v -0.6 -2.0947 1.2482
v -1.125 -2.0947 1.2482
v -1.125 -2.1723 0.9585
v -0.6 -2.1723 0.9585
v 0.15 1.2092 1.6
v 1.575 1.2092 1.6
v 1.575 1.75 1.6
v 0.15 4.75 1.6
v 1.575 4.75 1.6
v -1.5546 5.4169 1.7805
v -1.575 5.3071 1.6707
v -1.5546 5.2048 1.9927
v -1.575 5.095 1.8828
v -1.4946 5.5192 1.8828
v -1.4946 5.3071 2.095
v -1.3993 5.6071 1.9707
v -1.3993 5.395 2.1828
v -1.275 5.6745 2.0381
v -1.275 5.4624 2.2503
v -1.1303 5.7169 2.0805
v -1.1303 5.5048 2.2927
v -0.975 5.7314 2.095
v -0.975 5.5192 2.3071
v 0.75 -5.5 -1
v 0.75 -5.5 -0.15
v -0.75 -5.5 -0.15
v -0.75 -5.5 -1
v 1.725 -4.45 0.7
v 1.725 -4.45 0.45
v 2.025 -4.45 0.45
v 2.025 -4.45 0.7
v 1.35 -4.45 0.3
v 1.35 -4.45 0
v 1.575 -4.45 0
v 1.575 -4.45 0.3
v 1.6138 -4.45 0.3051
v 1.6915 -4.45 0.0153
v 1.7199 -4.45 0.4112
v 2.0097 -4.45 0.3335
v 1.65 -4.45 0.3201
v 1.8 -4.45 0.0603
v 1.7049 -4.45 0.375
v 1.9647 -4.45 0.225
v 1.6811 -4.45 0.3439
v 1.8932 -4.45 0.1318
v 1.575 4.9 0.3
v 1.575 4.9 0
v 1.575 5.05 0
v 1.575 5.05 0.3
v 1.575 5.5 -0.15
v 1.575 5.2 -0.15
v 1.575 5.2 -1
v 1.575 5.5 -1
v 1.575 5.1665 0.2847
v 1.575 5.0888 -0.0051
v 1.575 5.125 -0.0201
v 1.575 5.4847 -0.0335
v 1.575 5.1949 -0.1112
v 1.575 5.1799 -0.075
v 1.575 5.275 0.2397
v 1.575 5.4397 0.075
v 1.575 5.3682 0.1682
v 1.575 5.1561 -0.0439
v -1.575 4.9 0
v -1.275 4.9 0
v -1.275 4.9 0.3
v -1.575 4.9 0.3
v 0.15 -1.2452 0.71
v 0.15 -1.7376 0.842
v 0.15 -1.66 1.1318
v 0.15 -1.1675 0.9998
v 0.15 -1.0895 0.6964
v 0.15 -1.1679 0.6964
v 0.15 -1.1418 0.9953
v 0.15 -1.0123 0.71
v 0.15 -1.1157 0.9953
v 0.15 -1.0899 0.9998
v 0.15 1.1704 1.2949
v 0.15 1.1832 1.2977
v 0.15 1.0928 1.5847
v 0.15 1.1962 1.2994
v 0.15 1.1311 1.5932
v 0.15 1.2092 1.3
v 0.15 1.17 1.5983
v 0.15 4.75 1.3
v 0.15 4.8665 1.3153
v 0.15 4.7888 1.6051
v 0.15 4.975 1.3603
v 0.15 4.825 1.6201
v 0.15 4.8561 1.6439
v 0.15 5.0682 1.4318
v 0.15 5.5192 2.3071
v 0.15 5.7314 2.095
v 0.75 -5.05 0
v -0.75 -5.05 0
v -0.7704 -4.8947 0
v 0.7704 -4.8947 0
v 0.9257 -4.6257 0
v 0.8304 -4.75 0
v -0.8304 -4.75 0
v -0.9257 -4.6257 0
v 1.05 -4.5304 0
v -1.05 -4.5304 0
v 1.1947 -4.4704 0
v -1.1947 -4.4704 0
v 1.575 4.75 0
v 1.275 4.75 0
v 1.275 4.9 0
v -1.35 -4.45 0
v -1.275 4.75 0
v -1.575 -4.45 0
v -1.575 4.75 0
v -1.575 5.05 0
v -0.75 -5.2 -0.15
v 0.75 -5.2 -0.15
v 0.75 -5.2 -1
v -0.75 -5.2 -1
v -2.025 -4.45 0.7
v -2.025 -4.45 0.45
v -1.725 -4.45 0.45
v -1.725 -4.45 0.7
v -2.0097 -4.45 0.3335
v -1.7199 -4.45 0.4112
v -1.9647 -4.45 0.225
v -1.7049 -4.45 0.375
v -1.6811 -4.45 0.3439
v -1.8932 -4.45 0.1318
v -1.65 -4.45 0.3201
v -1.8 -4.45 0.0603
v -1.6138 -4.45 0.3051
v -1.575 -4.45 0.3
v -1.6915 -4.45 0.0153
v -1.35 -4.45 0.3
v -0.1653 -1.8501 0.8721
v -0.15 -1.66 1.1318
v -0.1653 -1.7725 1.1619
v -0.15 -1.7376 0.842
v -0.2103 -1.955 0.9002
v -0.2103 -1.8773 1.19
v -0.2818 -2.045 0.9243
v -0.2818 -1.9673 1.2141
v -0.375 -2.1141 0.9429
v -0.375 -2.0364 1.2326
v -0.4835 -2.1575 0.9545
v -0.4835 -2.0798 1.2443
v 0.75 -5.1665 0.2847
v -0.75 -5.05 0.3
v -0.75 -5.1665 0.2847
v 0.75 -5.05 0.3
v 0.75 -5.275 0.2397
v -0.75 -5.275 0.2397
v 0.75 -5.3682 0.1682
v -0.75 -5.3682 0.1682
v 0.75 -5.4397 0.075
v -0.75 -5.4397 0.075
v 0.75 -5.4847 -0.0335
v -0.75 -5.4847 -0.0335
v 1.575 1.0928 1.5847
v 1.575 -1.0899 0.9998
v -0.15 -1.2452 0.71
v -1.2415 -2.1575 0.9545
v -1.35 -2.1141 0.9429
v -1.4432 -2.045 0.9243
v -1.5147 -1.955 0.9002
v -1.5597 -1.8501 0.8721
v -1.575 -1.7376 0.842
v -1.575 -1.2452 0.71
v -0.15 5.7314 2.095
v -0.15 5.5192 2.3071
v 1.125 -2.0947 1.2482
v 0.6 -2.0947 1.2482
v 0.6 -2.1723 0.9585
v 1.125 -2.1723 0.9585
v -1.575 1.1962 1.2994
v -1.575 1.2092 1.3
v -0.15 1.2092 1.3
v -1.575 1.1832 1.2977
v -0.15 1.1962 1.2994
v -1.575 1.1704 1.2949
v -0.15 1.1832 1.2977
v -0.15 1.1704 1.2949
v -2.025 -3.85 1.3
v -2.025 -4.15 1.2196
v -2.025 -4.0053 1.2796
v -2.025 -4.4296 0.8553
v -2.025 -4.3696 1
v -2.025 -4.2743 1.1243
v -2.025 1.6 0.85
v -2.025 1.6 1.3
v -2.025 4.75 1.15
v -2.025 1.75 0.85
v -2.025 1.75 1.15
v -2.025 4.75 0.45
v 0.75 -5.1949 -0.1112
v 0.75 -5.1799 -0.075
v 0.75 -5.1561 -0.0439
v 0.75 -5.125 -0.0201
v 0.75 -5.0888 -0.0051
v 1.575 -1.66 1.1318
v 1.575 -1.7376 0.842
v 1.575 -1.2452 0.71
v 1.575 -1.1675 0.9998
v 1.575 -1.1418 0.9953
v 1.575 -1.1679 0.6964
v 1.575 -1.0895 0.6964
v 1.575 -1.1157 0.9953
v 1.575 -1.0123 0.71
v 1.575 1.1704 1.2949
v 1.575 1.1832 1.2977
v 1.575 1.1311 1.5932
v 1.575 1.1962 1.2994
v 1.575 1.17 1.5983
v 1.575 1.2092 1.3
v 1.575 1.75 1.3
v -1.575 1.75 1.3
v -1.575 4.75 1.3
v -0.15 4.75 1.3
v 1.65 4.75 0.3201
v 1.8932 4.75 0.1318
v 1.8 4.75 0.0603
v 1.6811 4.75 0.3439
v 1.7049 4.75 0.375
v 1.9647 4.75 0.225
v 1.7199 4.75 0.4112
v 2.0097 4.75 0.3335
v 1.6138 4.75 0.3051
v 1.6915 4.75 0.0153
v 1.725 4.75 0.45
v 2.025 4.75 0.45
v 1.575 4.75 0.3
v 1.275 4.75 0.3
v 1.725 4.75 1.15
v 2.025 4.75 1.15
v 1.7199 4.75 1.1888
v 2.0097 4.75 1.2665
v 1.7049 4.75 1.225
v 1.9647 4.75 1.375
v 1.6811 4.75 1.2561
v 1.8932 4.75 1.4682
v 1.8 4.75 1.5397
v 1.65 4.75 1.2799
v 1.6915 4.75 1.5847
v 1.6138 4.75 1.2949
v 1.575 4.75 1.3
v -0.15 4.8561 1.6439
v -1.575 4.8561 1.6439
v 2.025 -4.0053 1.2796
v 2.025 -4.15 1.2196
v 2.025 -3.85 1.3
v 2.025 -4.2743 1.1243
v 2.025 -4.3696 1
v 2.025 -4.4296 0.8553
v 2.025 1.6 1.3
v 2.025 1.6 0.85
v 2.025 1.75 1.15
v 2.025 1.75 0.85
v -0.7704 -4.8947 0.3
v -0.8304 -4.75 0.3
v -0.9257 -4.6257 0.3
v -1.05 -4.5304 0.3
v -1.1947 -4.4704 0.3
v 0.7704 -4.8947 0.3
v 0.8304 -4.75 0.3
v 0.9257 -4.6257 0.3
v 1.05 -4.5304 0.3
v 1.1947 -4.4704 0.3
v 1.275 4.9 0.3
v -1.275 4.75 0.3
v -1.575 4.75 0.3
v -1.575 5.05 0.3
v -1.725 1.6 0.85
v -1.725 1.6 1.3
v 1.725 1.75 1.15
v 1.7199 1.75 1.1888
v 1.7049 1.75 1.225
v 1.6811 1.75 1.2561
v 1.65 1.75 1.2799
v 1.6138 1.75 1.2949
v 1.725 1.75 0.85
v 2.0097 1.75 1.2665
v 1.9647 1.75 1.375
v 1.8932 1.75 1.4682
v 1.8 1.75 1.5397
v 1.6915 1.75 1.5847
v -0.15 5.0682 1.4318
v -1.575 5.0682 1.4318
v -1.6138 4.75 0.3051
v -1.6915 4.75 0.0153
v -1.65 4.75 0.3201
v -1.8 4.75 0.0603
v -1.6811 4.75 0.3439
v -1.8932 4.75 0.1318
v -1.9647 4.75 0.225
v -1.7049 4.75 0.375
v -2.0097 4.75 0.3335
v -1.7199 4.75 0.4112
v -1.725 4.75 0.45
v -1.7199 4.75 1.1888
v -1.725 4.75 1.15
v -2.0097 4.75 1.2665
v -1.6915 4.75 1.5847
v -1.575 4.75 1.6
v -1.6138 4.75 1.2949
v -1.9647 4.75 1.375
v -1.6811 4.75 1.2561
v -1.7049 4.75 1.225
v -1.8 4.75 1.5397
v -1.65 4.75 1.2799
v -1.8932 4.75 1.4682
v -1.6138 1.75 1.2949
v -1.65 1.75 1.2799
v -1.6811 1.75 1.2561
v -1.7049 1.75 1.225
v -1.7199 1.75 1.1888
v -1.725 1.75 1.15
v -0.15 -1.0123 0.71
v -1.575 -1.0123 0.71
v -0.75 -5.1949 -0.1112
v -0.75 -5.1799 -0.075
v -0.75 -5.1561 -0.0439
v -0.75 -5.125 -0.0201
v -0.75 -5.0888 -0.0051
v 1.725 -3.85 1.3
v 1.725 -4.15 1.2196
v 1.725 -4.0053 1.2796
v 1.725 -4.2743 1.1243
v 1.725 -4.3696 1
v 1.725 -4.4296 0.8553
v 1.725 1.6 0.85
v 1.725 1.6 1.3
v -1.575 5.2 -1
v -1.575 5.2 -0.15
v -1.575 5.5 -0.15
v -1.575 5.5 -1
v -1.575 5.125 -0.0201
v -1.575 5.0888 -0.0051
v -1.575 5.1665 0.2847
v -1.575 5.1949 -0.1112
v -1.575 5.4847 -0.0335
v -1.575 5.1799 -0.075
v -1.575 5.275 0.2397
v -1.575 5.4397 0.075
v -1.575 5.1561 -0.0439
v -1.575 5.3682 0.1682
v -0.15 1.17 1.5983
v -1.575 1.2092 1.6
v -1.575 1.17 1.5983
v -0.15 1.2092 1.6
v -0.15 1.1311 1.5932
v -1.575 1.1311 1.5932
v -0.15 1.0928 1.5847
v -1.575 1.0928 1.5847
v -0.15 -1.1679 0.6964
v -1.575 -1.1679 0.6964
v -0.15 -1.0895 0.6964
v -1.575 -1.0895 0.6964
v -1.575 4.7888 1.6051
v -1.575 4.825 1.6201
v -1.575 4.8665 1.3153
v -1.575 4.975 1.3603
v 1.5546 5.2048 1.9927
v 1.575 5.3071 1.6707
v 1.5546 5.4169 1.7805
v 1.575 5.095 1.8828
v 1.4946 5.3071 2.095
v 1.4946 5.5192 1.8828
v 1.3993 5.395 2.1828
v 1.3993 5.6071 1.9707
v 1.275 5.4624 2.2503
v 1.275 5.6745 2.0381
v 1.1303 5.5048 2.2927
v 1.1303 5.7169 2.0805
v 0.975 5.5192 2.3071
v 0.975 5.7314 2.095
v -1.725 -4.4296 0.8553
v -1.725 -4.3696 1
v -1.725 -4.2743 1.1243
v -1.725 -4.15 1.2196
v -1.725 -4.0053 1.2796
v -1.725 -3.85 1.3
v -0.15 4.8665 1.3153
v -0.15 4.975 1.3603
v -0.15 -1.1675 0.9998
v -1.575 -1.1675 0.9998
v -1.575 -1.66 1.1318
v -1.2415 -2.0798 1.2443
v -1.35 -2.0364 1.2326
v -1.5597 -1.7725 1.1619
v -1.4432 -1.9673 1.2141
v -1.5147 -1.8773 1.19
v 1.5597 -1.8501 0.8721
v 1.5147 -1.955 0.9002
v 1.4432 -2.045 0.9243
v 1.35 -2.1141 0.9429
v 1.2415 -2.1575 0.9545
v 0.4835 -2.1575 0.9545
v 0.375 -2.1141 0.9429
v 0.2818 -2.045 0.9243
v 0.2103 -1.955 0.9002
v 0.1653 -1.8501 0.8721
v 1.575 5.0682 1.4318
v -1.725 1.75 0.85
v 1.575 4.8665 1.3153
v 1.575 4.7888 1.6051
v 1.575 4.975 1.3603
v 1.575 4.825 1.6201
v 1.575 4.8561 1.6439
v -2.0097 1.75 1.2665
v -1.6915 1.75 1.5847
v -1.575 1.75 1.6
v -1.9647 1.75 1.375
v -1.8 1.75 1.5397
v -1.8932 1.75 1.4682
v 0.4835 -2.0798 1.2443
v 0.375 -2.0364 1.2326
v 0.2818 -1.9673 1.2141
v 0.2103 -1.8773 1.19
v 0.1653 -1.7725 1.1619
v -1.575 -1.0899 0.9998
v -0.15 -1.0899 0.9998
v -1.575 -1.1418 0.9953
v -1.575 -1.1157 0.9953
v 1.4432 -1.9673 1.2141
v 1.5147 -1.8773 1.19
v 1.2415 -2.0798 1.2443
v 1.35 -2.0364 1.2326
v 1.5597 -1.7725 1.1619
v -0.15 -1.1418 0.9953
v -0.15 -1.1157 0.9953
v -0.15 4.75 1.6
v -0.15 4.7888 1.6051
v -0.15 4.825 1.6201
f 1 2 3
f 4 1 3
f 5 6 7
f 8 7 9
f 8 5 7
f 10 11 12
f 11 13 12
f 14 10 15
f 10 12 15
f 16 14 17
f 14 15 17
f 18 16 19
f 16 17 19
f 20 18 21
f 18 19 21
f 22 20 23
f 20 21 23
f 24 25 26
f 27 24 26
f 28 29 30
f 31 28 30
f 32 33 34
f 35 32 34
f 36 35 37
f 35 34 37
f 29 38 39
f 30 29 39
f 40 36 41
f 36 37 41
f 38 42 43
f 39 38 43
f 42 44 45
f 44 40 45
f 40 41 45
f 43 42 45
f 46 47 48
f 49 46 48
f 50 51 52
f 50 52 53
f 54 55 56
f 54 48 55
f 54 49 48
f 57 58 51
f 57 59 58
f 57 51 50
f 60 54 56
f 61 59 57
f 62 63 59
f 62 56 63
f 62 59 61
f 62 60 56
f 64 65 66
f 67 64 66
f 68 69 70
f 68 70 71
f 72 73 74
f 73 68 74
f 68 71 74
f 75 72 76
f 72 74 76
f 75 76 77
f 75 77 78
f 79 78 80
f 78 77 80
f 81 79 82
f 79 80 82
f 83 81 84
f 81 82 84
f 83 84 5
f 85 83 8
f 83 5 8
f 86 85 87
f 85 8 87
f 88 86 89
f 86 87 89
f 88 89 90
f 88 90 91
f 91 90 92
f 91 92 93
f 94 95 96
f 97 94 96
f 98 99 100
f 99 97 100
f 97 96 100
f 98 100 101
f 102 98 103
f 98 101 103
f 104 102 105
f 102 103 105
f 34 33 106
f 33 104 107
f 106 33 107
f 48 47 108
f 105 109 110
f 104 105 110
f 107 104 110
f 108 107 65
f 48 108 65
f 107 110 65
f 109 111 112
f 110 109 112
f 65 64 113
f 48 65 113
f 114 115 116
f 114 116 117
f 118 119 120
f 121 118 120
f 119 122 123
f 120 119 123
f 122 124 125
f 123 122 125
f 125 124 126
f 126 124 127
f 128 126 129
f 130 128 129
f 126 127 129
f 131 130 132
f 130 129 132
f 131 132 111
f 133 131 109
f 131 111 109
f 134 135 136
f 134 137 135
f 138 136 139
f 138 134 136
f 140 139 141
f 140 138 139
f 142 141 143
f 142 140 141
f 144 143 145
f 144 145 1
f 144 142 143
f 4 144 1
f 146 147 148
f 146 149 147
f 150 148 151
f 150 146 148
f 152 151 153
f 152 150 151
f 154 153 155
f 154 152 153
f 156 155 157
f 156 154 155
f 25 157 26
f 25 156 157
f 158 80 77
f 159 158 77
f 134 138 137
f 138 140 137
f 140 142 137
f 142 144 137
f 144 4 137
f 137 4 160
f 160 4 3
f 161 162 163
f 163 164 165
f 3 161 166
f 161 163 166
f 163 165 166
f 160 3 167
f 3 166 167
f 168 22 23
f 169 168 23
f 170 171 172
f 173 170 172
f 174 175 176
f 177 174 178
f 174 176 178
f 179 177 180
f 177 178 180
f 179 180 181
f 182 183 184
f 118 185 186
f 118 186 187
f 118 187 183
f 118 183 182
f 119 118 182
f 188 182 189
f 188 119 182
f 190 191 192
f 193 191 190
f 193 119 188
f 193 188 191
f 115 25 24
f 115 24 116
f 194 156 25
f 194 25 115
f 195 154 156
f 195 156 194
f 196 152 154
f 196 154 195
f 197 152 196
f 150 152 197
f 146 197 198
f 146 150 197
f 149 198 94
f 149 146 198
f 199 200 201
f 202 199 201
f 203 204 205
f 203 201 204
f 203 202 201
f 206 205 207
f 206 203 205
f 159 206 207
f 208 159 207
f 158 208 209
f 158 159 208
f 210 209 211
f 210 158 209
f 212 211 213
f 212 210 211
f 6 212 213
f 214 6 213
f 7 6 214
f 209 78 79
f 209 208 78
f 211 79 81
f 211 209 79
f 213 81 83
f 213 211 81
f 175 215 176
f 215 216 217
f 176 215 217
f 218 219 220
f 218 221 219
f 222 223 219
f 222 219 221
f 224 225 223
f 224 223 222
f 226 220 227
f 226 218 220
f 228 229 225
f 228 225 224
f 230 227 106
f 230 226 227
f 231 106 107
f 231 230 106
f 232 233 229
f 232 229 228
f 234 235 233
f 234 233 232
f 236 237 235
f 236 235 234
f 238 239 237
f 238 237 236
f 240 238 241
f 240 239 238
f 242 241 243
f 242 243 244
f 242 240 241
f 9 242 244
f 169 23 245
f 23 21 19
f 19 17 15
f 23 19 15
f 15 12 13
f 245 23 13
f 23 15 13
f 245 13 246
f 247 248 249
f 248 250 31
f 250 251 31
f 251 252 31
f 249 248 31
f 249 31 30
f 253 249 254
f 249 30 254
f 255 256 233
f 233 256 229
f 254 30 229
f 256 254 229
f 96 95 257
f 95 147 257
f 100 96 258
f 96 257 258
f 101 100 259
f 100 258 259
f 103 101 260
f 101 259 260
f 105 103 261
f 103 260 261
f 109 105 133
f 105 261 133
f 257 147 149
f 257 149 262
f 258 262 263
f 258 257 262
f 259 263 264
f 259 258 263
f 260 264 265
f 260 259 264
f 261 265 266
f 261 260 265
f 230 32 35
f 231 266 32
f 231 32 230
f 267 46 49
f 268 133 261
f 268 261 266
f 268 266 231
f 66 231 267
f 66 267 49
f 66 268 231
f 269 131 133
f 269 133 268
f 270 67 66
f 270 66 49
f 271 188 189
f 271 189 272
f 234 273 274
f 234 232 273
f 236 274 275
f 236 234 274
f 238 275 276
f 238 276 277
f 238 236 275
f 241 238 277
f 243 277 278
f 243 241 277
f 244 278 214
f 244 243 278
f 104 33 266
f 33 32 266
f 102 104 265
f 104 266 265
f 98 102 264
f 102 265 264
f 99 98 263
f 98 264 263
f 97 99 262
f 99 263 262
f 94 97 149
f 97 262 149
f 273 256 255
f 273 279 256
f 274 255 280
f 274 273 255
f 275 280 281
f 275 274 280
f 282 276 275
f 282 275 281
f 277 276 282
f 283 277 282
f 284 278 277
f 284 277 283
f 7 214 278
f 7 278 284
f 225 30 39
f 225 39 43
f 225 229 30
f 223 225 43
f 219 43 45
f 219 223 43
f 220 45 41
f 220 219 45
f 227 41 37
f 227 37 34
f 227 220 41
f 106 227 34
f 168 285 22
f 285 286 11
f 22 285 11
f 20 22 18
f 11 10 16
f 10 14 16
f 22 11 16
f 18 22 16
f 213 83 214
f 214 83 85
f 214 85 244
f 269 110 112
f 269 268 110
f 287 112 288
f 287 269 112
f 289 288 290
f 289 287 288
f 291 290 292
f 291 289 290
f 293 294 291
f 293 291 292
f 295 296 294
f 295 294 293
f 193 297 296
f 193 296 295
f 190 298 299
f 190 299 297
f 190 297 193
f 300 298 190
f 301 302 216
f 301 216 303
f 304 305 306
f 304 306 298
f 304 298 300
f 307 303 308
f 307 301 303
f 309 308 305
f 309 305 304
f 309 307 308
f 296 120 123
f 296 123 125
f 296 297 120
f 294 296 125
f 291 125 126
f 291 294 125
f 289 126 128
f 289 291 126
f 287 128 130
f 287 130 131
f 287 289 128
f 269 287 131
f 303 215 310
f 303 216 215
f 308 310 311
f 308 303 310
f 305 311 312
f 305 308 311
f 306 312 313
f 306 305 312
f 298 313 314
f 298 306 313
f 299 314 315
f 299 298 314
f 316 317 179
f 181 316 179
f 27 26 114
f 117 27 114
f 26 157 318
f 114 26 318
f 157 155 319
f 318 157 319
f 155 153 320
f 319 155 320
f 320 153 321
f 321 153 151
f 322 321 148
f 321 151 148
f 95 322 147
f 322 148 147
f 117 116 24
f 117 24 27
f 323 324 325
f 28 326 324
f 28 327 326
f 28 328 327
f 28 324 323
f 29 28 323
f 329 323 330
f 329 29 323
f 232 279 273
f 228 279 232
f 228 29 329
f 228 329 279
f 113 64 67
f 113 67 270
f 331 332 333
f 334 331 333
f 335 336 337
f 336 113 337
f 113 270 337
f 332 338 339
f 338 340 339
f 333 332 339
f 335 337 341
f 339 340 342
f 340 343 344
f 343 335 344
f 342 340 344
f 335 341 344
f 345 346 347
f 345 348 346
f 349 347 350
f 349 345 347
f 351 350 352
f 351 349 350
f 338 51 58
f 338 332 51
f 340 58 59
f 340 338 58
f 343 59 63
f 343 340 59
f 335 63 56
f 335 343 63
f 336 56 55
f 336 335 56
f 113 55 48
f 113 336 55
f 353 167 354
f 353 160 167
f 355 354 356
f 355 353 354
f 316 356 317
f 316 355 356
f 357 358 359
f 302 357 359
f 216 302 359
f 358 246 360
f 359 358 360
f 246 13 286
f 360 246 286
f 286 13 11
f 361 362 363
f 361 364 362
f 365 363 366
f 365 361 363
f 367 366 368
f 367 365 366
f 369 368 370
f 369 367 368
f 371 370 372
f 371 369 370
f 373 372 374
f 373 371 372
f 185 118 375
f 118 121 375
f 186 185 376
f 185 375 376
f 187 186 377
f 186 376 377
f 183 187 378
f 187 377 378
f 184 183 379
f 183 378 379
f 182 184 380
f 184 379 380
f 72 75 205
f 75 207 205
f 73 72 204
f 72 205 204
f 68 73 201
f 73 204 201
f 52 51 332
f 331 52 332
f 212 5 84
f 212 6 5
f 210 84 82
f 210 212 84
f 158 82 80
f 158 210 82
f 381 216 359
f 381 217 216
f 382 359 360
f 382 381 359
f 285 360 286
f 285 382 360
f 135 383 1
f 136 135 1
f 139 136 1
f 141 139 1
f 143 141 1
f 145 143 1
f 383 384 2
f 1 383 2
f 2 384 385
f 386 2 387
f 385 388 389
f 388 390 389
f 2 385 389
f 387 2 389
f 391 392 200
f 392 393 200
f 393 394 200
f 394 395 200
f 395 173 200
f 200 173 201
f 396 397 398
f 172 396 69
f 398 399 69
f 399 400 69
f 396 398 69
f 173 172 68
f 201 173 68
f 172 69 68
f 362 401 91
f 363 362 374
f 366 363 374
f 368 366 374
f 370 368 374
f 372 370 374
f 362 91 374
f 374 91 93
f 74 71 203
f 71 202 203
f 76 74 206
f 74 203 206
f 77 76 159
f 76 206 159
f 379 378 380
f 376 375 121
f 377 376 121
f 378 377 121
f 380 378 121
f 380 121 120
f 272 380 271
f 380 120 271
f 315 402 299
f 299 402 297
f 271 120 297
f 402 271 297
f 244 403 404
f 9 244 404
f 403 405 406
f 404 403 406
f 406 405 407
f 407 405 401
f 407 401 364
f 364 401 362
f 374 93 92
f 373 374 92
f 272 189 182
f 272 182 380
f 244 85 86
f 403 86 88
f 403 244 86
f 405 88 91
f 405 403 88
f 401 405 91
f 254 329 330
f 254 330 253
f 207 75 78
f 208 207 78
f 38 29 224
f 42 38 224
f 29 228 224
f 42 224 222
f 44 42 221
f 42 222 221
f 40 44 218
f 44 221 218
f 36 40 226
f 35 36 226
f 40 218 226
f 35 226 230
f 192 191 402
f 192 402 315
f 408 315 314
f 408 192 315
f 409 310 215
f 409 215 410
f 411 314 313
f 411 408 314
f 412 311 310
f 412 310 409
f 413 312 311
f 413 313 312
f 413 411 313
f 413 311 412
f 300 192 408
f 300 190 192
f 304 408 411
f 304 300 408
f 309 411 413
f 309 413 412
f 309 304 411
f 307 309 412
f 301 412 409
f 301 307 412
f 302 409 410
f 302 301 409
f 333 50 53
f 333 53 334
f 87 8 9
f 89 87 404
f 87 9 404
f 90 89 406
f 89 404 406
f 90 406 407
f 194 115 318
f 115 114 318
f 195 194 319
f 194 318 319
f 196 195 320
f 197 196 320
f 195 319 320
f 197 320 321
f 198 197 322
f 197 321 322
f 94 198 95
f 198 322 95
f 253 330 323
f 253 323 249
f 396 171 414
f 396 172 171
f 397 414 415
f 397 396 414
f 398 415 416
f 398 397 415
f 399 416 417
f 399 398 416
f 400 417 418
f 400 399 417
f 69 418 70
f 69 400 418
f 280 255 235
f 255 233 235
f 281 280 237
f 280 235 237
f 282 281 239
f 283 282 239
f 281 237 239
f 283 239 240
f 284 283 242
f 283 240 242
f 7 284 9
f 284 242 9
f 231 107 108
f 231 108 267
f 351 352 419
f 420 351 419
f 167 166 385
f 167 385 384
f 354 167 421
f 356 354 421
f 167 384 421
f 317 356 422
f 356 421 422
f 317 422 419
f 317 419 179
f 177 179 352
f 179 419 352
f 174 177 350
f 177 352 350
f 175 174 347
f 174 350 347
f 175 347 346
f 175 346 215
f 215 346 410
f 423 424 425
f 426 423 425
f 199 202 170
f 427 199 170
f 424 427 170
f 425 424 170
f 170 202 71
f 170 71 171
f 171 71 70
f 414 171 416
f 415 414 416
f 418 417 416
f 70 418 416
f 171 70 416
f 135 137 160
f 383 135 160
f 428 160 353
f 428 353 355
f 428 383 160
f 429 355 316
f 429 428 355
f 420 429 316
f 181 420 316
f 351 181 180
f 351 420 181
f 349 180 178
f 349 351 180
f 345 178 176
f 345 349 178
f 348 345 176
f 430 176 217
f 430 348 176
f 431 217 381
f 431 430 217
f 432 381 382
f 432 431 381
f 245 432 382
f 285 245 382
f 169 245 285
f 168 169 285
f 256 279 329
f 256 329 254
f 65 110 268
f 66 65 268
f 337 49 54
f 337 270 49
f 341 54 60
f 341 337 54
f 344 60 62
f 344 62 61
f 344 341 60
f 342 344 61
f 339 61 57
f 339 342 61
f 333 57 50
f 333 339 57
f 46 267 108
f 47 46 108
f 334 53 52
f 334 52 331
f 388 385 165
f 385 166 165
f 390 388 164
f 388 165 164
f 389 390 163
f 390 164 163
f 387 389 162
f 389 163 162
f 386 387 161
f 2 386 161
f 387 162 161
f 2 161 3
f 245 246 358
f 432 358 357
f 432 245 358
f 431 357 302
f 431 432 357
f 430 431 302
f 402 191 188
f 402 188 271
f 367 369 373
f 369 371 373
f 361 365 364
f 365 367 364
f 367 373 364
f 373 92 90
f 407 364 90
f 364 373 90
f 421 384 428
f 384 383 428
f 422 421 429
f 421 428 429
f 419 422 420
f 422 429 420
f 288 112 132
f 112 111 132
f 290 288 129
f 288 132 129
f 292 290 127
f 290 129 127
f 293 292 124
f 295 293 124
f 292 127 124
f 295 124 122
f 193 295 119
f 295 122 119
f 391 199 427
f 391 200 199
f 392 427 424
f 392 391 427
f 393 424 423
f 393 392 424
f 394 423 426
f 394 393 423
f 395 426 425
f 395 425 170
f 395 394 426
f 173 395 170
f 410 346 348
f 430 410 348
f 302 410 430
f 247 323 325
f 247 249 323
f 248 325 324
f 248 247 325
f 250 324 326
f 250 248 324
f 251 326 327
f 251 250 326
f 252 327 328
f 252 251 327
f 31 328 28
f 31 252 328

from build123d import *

# Parameters (mm, degrees)
CUT_EXTRUDE1_START     = -2.025
CUT_EXTRUDE1_OUTLINE_W = 3.186396103
CUT_EXTRUDE1_OUTLINE_H = 1.6
CUT_EXTRUDE1_DEPTH     = 4.05
CUT_EXTRUDE1_START_2   = -1.575
CUT_EXTRUDE1_2_DEPTH   = 1.425
CUT_EXTRUDE1_START_3   = 0.15
CUT_EXTRUDE1_3_DEPTH   = 1.425
SKETCH2_W              = 0.3
SKETCH2_H              = 3.186396103
CUT_EXTRUDE2_DEPTH     = 0.3
CUT_EXTRUDE3_DEPTH     = 0.186396103
SKETCH4_W              = 3.45
SKETCH4_H              = 3
CUT_EXTRUDE4_DEPTH     = 1
BOSS_EXTRUDE1_DEPTH    = 6.2
SKETCH6_W              = 2.55
SKETCH6_H              = 0.3
BOSS_EXTRUDE2_DEPTH    = 0.75
SKETCH7_W              = 0.3
SKETCH7_H              = 0.6
BOSS_EXTRUDE3_DEPTH    = 0.3
SKETCH8_W              = 0.3
SKETCH8_H              = 0.6
BOSS_EXTRUDE4_DEPTH    = 0.3
SKETCH9_W              = 3.15
SKETCH9_H              = 0.3
BOSS_EXTRUDE5_DEPTH    = 1
SKETCH10_W             = 0.3
SKETCH10_H             = 6.05
BOSS_EXTRUDE6_DEPTH    = 0.45
SKETCH11_W             = 1.5
SKETCH11_H             = 0.3
BOSS_EXTRUDE7_DEPTH    = 1.05
SKETCH12_W             = 1.5
SKETCH12_H             = 0.3
BOSS_EXTRUDE8_DEPTH    = 1
SKETCH13_W             = 0.3
SKETCH13_H             = 6.05
BOSS_EXTRUDE9_DEPTH    = 0.45
DRAFT1_ANGLE           = 45
DRAFT2_ANGLE           = 45
FILLET1_R              = 0.15
FILLET2_R              = 0.45
FILLET3_R              = 0.6


with BuildPart() as part:
    # Cut-Extrude1: read off the stored shape, not the designer's step
    # Cut-Extrude1 outline → Cut-Extrude1 (new body)
    with BuildSketch(Plane.YZ.offset(CUT_EXTRUDE1_START)):
        with Locations((3.343198051, 0.8)):
            Rectangle(CUT_EXTRUDE1_OUTLINE_W, CUT_EXTRUDE1_OUTLINE_H)
    extrude(amount=CUT_EXTRUDE1_DEPTH)

    # Cut-Extrude1 2 outline → Cut-Extrude1 2 (add)
    with BuildSketch(Plane.YZ.offset(CUT_EXTRUDE1_START_2)):
        Polygon((4.936396103, 1.6), (4.936396103, 1.3), (5.73137085, 2.094974747), (4.812132034, 3.014213562), (4.812132034, 1.6), align=None)
        Polygon((1.189495749, 1.3), (1.75, 1.3), (1.75, 1.6), (1.15, 1.6), (-1.128726234, 0.989417146), (-2.09465206, 1.248236191), (-2.172297774, 0.958458443), (-1.128726234, 0.678834292), align=None)
    extrude(amount=CUT_EXTRUDE1_2_DEPTH)

    # Cut-Extrude1 3 outline → Cut-Extrude1 3 (add)
    with BuildSketch(Plane.YZ.offset(CUT_EXTRUDE1_START_3)):
        Polygon((4.936396103, 1.6), (4.936396103, 1.3), (5.73137085, 2.094974747), (4.812132034, 3.014213562), (4.812132034, 1.6), align=None)
        Polygon((1.189495749, 1.3), (1.75, 1.3), (1.75, 1.6), (1.15, 1.6), (-1.128726234, 0.989417146), (-2.09465206, 1.248236191), (-2.172297774, 0.958458443), (-1.128726234, 0.678834292), align=None)
    extrude(amount=CUT_EXTRUDE1_3_DEPTH)

    # Sketch2 → Cut-Extrude2 (cut)
    with BuildSketch(Plane.XY.offset(1.6)):
        with Locations((0, 3.343198051)):
            Rectangle(SKETCH2_W, SKETCH2_H)
    extrude(amount=-CUT_EXTRUDE2_DEPTH, mode=Mode.SUBTRACT)

    # Sketch3 → Cut-Extrude3 (cut)
    with BuildSketch(Plane(origin=(0, 4.936396103, 0), x_dir=(-1, 0, 0), z_dir=(0, 1, 0))):
        Polygon((-1.575, 1.3), (-1.575, 1.6), (-2.025, 1.6), (-2.025, 0), (2.025, 0), (2.025, 1.6), (1.575, 1.6), (1.575, 1.3), (0.15, 1.3), (-0.15, 1.3), align=None)
    extrude(amount=-CUT_EXTRUDE3_DEPTH, mode=Mode.SUBTRACT)

    # Sketch4 → Cut-Extrude4 (cut)
    with BuildSketch(Plane.XY.offset(1.3)):
        with Locations((0, 3.25)):
            Rectangle(SKETCH4_W, SKETCH4_H)
    extrude(amount=-CUT_EXTRUDE4_DEPTH, mode=Mode.SUBTRACT)

    # Sketch5 → Boss-Extrude1 (add)
    with BuildSketch(Plane.XZ.offset(-1.75)):
        Polygon((-1.725, 0.85), (-1.725, 0.3), (1.725, 0.3), (1.725, 0.85), (2.025, 0.85), (2.025, 0), (-2.025, 0), (-2.025, 0.85), align=None)
    extrude(amount=BOSS_EXTRUDE1_DEPTH)

    # Sketch6 → Boss-Extrude2 (add)
    with BuildSketch(Plane(origin=(0, 4.75, 0), x_dir=(-1, 0, 0), z_dir=(0, 1, 0))):
        with Locations((0, 0.15)):
            Rectangle(SKETCH6_W, SKETCH6_H)
    extrude(amount=BOSS_EXTRUDE2_DEPTH)

    # Sketch7 → Boss-Extrude3 (add)
    with BuildSketch(Plane.ZY.offset(1.275)):
        with Locations((0.15, 5.2)):
            Rectangle(SKETCH7_W, SKETCH7_H)
    extrude(amount=BOSS_EXTRUDE3_DEPTH)

    # Sketch8 → Boss-Extrude4 (add)
    with BuildSketch(Plane(origin=(1.275, 0, 0), x_dir=(0, 0, -1), z_dir=(1, 0, 0))):
        with Locations((-0.15, 5.2)):
            Rectangle(SKETCH8_W, SKETCH8_H)
    extrude(amount=BOSS_EXTRUDE4_DEPTH)

    # Sketch9 → Boss-Extrude5 (add)
    with BuildSketch(Plane(origin=(0, 0, 0), x_dir=(-1, 0, 0), z_dir=(0, 0, -1))):
        with Locations((0, 5.35)):
            Rectangle(SKETCH9_W, SKETCH9_H)
    extrude(amount=BOSS_EXTRUDE5_DEPTH)

    # Sketch10 → Boss-Extrude6 (add)
    with BuildSketch(Plane.XY.offset(0.85)):
        with Locations((-1.875, -1.425)):
            Rectangle(SKETCH10_W, SKETCH10_H)
    extrude(amount=BOSS_EXTRUDE6_DEPTH)

    # Sketch11 → Boss-Extrude7 (add)
    with BuildSketch(Plane.XZ.offset(4.45)):
        with Locations((0, 0.15)):
            Rectangle(SKETCH11_W, SKETCH11_H)
    extrude(amount=BOSS_EXTRUDE7_DEPTH)

    # Sketch12 → Boss-Extrude8 (add)
    with BuildSketch(Plane(origin=(0, 0, 0), x_dir=(-1, 0, 0), z_dir=(0, 0, -1))):
        with Locations((0, -5.35)):
            Rectangle(SKETCH12_W, SKETCH12_H)
    extrude(amount=BOSS_EXTRUDE8_DEPTH)

    # Sketch13 → Boss-Extrude9 (add)
    with BuildSketch(Plane.XY.offset(0.85)):
        with Locations((1.875, -1.425)):
            Rectangle(SKETCH13_W, SKETCH13_H)
    extrude(amount=BOSS_EXTRUDE9_DEPTH)

    # Draft1
    draft1_faces = [part.faces().sort_by_distance(p)[0] for p in [
        (0.8625, 4.812132034, 2.307106781),
    ]]
    draft(draft1_faces, Plane(origin=(0.960282071, 3.25, 1.6), x_dir=(1, 0, 0), z_dir=(0, 0, 1)), DRAFT1_ANGLE)

    # Draft2
    draft2_faces = [part.faces().sort_by_distance(p)[0] for p in [
        (-0.8625, 4.812132034, 2.307106781),
    ]]
    draft(draft2_faces, Plane(origin=(0.960282071, 3.25, 1.6), x_dir=(1, 0, 0), z_dir=(0, 0, 1)), DRAFT2_ANGLE)

    # Fillet1
    fillet1_edges = [part.edges().sort_by_distance(p)[0] for p in [
        (1.725, 3.25, 1.3),
        (0.8625, 1.189495749, 1.3),
        (0, -5.2, 0),
        (-0.8625, 4.812132034, 1.6),
        (0, 5.2, 0),
        (-1.725, 0.15, 0.3),
        (-0.8625, -1.128726234, 0.989417146),
        (-1.725, 3.25, 1.3),
        (0.8625, 4.812132034, 1.6),
        (0.8625, -1.128726234, 0.989417146),
        (-0.8625, 1.189495749, 1.3),
        (1.725, 0.15, 0.3),
    ]]
    fillet(fillet1_edges, radius=FILLET1_R)

    # Fillet2
    fillet2_edges = [part.edges().sort_by_distance(p)[0] for p in [
        (-2.025, 3.25, 1.6),
        (1.575, -2.133474917, 1.103347317),
        (0.15, -2.133474917, 1.103347317),
        (0.8625, -1.128726234, 0.678834292),
        (-0.8625, 4.936396103, 1.3),
        (0, 5.5, 0.3),
        (-0.8625, 1.15, 1.6),
        (2.025, 3.25, 1.6),
        (-0.15, -2.133474917, 1.103347317),
        (-1.575, -2.133474917, 1.103347317),
        (2.025, 0.15, 0),
        (-2.025, 0.15, 0),
        (0, -5.5, 0.3),
        (-0.8625, -1.128726234, 0.678834292),
        (0.8625, 4.936396103, 1.3),
        (0.8625, 1.15, 1.6),
    ]]
    fillet(fillet2_edges, radius=FILLET2_R)

    # Fillet3
    fillet3_edges = [part.edges().sort_by_distance(p)[0] for p in [
        (1.575, 5.625304833, 2.201040764),
        (1.875, -4.45, 1.3),
        (-1.875, -4.45, 1.3),
        (-0.75, -4.45, 0.15),
        (-1.575, 5.625304833, 2.201040764),
        (0.75, -4.45, 0.15),
    ]]
    fillet(fillet3_edges, radius=FILLET3_R)


solid = part.part
